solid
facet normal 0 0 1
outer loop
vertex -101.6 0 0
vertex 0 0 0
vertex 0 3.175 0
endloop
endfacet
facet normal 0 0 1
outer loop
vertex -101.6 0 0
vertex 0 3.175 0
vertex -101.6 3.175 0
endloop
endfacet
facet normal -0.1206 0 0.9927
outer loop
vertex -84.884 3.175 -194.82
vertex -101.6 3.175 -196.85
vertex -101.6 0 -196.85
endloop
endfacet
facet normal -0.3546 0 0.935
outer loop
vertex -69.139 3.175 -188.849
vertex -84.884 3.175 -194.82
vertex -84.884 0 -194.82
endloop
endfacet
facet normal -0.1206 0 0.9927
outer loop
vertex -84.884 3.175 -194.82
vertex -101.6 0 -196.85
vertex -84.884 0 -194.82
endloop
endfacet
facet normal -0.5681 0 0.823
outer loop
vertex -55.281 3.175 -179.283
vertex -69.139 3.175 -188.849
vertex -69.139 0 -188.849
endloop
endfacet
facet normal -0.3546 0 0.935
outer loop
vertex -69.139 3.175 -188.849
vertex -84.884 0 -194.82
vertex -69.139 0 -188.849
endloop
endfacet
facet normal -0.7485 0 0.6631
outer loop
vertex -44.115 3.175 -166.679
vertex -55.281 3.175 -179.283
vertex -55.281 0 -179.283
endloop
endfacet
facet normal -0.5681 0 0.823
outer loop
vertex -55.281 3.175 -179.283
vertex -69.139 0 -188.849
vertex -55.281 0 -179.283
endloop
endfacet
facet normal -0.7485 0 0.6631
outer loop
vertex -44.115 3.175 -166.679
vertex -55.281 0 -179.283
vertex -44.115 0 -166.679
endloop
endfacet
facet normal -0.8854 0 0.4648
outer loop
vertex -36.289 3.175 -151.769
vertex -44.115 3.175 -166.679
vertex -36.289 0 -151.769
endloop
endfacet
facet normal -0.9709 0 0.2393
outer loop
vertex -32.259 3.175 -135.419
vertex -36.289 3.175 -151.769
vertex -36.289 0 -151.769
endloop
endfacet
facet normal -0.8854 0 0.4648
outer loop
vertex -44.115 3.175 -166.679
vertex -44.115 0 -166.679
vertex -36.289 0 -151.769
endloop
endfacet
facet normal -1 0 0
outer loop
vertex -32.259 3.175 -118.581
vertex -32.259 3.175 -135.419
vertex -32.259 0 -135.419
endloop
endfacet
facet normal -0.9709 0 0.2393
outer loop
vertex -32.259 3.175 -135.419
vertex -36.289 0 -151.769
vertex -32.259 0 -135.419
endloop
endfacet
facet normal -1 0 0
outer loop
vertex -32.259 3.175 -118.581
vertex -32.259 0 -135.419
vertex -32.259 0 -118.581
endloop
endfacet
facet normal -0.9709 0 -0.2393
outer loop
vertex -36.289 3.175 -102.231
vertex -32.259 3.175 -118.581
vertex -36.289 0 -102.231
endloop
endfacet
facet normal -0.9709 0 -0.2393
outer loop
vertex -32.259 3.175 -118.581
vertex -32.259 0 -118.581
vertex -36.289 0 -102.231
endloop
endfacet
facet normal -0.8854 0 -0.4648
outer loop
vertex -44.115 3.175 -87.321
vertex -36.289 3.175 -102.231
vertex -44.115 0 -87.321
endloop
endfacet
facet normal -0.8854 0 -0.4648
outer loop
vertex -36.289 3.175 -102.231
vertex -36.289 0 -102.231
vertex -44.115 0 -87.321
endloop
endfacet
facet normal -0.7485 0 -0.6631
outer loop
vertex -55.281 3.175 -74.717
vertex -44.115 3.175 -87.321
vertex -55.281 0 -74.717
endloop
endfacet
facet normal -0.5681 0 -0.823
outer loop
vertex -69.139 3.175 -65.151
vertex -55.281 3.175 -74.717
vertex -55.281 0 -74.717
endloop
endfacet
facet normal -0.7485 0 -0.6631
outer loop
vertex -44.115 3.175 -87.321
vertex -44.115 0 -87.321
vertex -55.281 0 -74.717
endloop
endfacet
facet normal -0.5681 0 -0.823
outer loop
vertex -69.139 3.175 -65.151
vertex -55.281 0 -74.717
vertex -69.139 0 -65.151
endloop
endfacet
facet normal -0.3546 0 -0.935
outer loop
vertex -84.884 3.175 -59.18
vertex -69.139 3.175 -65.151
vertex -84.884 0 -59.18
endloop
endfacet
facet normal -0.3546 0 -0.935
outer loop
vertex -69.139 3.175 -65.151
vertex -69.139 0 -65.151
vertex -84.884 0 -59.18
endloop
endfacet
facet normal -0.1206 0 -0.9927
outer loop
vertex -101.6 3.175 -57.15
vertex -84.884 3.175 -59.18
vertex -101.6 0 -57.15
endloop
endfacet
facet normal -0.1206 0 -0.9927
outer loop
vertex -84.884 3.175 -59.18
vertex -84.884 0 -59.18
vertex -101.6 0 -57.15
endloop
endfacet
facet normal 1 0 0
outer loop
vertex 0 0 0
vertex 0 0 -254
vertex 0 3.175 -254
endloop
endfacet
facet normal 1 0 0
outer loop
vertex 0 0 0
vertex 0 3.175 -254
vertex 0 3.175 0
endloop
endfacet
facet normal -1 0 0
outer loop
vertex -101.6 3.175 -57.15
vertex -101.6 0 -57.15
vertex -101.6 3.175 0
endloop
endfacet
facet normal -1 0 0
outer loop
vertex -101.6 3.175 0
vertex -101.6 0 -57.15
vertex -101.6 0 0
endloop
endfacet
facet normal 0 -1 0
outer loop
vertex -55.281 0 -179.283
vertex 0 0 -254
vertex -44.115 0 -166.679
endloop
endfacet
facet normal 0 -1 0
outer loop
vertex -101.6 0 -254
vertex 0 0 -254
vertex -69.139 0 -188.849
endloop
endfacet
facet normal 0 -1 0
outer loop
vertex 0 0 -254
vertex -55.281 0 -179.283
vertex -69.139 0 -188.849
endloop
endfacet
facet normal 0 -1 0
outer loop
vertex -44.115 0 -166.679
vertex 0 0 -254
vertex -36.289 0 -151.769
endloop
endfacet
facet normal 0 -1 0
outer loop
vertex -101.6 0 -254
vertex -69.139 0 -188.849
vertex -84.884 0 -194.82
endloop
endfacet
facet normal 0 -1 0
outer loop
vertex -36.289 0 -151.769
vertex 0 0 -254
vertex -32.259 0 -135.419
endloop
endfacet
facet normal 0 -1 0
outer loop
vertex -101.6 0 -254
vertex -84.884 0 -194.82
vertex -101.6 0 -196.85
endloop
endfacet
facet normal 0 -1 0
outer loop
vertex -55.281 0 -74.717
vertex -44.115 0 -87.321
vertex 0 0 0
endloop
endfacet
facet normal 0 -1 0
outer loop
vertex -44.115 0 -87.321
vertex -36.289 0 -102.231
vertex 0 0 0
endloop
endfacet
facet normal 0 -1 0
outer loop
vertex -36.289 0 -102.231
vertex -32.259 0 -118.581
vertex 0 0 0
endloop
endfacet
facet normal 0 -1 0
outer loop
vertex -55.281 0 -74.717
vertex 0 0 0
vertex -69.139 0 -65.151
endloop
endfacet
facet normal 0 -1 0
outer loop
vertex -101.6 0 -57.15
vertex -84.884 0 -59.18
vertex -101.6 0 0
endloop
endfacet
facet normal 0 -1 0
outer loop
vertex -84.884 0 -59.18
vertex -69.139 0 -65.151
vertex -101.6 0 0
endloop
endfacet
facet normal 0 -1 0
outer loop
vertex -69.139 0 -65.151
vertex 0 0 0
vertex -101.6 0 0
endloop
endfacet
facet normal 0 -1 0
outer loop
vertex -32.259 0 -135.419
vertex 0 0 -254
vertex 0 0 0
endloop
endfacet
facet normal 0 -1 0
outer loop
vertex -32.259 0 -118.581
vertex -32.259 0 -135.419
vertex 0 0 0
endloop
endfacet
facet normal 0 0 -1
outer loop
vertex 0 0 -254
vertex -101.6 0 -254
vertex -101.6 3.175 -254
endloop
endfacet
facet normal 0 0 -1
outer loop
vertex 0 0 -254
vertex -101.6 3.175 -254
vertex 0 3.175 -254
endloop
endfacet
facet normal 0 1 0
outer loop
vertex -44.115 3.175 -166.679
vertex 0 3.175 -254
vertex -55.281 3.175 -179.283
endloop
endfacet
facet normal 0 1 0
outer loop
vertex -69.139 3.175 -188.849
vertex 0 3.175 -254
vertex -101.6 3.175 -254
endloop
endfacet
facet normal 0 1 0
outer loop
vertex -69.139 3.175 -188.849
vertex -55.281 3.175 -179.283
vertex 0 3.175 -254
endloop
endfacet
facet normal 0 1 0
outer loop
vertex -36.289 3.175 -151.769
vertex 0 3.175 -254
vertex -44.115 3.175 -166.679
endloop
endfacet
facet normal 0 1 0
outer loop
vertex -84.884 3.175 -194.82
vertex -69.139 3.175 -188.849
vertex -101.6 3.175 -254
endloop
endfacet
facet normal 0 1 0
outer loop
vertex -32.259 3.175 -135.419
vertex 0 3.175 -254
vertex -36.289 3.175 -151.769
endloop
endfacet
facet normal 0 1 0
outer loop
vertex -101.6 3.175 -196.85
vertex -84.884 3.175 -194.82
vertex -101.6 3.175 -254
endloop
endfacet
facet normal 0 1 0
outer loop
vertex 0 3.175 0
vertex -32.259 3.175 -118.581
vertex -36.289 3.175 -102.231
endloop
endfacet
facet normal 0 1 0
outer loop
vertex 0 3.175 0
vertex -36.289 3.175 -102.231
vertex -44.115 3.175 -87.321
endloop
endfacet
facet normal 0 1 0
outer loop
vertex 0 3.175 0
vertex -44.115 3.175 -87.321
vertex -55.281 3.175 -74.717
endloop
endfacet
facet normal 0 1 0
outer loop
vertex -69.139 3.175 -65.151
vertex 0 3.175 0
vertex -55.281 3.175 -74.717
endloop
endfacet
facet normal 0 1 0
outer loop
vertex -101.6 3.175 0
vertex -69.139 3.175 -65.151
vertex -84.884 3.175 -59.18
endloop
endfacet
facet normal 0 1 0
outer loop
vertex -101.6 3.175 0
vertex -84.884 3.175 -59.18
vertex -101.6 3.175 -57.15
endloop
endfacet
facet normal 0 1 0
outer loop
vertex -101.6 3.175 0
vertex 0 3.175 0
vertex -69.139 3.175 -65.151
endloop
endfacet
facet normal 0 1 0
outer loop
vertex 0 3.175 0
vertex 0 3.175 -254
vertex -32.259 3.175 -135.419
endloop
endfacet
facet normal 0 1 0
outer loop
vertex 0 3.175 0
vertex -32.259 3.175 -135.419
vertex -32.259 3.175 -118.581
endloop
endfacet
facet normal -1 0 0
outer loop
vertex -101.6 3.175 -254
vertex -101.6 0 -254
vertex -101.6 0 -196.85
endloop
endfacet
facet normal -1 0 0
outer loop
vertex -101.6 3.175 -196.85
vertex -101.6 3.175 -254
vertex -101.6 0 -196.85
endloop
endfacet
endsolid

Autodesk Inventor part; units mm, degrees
ref_plane "YZ Plane" through (0, 0, 0) normal (1, 0, 0) x (0, 1, 0)
ref_plane "XZ Plane" through (0, 0, 0) normal (0, 1, 0) x (-1, 0, 0)
ref_plane "XY Plane" through (0, 0, 0) normal (0, 0, 1) x (1, 0, 0)
sketch "Sketch1" plane through (0, 0, 0) normal (0, 1, 0) x (-1, 0, 0)
  line L0 (0, 0) -> (203.2, 0)
  line L1 (203.2, 0) -> (203.2, -254)
  line L2 (203.2, -254) -> (0, -254)
  line L3 (0, -254) -> (0, 0)
  line L4 (203.2, -127) -> (0, -127)
  line L5 (101.6, -254) -> (101.6, 0)
  circle A0 centre (101.6, -127) radius 69.85
  point P0 (171.45, -127)
  point P1 (31.75, -127)
  point P2 (101.6, -57.15)
  point P3 (101.6, -196.85)
  dimension "d0" = 203.2
  dimension "d1" = 254
  dimension "d2" = 139.7
extrude "Extrusion1" add sketch "Sketch1" along normal blind 3.175 contours L0 L5 A0 L4 L3 | L4 A0 L5 L2 L3
properties part number "1 Bottom Frame Base 1"
